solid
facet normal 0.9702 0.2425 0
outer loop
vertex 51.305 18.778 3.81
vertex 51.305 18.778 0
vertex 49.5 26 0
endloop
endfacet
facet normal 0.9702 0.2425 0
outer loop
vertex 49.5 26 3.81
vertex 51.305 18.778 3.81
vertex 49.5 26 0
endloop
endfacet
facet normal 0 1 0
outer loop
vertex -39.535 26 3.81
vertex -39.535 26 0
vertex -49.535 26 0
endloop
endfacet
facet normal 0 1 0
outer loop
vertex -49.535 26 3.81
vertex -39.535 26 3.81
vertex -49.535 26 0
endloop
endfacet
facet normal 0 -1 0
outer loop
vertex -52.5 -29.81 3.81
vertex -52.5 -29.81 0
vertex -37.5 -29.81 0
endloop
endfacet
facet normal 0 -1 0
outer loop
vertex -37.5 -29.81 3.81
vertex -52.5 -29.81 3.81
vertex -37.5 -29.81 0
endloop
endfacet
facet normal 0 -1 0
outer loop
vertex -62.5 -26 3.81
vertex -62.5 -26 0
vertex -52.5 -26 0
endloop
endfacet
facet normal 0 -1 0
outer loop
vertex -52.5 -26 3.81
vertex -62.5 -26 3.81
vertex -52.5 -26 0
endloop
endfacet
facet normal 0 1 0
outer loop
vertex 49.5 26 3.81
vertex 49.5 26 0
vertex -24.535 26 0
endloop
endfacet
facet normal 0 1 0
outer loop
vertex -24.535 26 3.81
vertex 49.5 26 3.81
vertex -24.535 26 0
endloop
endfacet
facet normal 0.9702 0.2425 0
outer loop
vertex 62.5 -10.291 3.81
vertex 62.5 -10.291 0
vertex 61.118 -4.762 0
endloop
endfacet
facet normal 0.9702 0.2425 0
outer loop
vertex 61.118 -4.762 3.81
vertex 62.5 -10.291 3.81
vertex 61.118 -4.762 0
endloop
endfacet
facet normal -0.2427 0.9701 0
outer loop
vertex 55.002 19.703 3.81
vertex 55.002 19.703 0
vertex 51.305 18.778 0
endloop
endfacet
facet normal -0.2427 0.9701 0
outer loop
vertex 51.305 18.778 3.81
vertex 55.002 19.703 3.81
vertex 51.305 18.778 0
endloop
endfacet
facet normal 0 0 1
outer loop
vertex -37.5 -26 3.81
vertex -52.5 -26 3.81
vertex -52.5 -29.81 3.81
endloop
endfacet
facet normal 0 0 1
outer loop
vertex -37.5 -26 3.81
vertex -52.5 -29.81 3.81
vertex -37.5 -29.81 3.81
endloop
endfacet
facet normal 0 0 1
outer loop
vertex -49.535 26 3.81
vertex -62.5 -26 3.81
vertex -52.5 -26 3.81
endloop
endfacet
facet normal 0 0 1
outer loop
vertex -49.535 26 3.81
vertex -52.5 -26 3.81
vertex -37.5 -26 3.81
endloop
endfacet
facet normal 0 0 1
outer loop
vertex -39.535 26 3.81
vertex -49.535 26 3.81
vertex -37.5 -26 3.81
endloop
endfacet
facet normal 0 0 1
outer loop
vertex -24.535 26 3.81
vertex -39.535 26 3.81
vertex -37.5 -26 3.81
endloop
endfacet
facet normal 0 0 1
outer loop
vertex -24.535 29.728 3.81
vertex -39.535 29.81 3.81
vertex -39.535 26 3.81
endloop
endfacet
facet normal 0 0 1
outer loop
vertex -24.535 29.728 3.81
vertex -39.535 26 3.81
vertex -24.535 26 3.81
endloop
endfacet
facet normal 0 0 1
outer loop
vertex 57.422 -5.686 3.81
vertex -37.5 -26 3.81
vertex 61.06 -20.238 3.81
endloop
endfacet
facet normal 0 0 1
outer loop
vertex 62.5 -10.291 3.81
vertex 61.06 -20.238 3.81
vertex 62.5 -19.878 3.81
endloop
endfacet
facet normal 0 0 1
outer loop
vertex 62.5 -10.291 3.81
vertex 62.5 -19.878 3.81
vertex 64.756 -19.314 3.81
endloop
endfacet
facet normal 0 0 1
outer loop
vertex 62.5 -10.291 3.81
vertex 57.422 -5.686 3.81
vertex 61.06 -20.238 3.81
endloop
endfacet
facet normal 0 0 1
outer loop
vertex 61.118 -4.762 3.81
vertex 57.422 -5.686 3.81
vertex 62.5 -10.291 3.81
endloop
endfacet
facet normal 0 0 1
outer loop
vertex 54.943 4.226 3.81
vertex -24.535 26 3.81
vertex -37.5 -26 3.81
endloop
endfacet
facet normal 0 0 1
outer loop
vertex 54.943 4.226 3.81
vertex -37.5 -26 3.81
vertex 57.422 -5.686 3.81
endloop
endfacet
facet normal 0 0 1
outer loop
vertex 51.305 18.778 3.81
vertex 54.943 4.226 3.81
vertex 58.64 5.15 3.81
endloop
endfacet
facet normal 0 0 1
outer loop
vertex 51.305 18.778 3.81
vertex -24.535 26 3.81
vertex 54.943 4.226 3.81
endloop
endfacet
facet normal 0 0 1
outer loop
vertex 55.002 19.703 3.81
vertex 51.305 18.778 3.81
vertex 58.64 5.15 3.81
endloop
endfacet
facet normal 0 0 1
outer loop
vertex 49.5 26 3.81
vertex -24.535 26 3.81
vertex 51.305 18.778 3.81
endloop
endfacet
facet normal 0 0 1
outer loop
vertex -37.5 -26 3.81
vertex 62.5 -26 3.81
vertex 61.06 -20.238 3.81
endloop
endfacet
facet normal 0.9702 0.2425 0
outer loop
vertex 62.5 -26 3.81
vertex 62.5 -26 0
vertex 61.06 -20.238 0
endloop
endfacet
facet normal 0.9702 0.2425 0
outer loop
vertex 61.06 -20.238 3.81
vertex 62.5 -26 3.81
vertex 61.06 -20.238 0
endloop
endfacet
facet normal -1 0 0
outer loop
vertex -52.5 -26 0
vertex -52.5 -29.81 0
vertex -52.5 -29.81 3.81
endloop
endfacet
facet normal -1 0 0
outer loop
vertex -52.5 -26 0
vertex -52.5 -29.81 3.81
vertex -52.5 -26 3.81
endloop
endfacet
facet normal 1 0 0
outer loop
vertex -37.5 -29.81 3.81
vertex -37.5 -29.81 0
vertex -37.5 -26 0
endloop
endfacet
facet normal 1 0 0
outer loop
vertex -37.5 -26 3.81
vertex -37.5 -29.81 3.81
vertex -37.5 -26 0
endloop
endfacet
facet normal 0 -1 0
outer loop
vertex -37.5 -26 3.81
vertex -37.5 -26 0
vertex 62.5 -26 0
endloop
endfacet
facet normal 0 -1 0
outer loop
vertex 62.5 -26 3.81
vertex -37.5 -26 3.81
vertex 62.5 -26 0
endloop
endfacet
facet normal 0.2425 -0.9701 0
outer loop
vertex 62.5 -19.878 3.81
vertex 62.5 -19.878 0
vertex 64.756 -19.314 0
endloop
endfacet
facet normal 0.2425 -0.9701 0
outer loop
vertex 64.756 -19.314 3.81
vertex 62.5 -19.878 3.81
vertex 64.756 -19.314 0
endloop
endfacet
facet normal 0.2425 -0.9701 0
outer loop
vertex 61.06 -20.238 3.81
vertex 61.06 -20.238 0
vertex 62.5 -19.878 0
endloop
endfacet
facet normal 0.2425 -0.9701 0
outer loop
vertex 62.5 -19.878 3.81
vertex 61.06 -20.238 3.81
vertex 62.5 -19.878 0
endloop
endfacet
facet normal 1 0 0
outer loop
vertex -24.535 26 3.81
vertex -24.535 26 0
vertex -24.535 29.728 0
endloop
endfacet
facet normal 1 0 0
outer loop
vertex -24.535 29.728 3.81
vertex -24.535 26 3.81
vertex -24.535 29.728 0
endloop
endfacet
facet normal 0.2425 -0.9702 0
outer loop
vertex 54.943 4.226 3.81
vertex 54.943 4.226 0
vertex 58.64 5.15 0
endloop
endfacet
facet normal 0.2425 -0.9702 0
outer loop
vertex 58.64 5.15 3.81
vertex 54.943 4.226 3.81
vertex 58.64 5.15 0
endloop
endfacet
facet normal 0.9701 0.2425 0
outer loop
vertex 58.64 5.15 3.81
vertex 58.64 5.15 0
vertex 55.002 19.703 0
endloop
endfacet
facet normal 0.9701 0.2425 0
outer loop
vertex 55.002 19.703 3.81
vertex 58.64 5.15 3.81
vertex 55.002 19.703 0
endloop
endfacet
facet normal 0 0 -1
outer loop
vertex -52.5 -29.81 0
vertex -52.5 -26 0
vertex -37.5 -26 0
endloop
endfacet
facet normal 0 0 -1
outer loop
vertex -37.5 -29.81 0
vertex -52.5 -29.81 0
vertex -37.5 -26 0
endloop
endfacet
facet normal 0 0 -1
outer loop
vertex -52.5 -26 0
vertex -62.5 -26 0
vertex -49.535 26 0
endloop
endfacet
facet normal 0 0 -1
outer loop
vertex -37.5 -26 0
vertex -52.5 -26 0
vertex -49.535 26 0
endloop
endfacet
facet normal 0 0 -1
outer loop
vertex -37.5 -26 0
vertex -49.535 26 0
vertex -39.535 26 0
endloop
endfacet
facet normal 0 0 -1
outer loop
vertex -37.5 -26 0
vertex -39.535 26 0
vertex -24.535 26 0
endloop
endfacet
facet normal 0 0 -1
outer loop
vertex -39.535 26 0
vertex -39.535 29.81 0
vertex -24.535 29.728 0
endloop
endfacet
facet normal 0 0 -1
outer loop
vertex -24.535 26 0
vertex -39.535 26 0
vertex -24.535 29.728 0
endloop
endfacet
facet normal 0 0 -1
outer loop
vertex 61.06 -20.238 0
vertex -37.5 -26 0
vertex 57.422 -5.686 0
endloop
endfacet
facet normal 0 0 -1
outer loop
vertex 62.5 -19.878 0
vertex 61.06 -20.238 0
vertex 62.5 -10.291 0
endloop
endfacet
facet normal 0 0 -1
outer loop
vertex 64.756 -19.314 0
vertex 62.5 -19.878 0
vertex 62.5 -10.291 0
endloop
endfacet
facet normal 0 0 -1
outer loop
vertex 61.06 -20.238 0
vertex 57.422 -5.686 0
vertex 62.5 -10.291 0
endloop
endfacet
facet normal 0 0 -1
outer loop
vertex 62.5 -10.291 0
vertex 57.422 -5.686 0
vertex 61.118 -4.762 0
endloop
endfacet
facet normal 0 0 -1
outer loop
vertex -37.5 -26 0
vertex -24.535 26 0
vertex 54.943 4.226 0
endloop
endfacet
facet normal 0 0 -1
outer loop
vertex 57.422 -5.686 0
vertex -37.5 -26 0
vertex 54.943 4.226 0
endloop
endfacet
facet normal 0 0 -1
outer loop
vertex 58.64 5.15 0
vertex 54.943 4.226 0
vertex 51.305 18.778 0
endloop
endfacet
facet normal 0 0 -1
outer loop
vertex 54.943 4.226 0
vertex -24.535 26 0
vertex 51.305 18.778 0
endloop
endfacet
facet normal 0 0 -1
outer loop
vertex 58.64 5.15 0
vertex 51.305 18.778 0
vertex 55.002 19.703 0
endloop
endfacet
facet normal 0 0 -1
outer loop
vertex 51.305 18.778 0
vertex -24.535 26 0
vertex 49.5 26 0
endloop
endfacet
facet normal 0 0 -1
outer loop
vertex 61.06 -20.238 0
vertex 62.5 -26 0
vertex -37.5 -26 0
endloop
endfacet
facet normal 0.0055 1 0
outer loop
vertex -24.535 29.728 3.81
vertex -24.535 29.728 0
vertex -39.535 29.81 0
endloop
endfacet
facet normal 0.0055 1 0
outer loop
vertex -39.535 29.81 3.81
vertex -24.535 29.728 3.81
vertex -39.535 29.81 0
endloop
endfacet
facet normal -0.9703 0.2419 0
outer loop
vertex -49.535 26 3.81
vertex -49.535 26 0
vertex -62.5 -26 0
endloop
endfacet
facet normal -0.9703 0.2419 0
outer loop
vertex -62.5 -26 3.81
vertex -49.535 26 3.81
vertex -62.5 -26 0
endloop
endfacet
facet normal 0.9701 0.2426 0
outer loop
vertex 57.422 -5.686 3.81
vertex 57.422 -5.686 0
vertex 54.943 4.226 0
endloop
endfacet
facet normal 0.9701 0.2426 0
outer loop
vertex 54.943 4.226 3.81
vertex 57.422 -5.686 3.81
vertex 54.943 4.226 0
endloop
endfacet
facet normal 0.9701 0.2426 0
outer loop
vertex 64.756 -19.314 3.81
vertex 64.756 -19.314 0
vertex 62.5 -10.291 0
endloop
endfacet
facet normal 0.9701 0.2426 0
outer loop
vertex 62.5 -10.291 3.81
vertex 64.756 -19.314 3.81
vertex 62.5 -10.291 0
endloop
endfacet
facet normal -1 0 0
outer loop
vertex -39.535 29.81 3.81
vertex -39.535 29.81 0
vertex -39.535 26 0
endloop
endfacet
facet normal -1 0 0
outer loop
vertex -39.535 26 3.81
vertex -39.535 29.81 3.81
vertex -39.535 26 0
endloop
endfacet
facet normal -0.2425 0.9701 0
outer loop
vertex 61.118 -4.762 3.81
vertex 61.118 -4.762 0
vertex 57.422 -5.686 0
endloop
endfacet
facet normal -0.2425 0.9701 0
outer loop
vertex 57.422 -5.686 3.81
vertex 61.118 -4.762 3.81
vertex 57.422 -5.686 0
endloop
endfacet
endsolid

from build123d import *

# Parameters (mm, degrees)
F0_W     = 15
F0_H     = 3.81
F1_DEPTH = 3.81


# Not quite as in the source:
# - a feature names something its author has since deleted; it is built from what else it names


with BuildPart() as f1:
    # F0 (on Top) → F1 (new body)
    with BuildSketch(Plane.XY):
        with Locations((-45, -27.905)):
            Rectangle(F0_W, F0_H)
        Polygon((-37.5, -26), (62.5, -26), (61.059539805, -20.23815922), (57.4215054295, -5.6860217178), (54.9434199682, 4.226320127), (51.3053855927, 18.7784576292), (49.5, 26), (-24.5351687992, 26), (-39.5349438522, 26), (-49.5349438522, 26), (-62.5, -26), (-52.5, -26), align=None)
        Polygon((61.059539805, -20.23815922), (62.5, -19.8780441712), (62.5, -10.2909675664), (61.117748355, -4.7619609864), (57.4215054295, -5.6860217178), align=None)
        Polygon((51.3053855927, 18.7784576292), (54.9434199682, 4.226320127), (58.6396628938, 5.1503808584), (55.0016285183, 19.7025183606), align=None)
        Polygon((62.5, -10.2909675664), (62.5, -19.8780441712), (64.7557827306, -19.3140984886), align=None)
        Polygon((-39.5349438522, 29.81), (-39.5349438522, 26), (-24.5351687992, 26), (-24.5351687992, 29.7278515898), align=None)
    extrude(amount=F1_DEPTH)


solid = f1.part
